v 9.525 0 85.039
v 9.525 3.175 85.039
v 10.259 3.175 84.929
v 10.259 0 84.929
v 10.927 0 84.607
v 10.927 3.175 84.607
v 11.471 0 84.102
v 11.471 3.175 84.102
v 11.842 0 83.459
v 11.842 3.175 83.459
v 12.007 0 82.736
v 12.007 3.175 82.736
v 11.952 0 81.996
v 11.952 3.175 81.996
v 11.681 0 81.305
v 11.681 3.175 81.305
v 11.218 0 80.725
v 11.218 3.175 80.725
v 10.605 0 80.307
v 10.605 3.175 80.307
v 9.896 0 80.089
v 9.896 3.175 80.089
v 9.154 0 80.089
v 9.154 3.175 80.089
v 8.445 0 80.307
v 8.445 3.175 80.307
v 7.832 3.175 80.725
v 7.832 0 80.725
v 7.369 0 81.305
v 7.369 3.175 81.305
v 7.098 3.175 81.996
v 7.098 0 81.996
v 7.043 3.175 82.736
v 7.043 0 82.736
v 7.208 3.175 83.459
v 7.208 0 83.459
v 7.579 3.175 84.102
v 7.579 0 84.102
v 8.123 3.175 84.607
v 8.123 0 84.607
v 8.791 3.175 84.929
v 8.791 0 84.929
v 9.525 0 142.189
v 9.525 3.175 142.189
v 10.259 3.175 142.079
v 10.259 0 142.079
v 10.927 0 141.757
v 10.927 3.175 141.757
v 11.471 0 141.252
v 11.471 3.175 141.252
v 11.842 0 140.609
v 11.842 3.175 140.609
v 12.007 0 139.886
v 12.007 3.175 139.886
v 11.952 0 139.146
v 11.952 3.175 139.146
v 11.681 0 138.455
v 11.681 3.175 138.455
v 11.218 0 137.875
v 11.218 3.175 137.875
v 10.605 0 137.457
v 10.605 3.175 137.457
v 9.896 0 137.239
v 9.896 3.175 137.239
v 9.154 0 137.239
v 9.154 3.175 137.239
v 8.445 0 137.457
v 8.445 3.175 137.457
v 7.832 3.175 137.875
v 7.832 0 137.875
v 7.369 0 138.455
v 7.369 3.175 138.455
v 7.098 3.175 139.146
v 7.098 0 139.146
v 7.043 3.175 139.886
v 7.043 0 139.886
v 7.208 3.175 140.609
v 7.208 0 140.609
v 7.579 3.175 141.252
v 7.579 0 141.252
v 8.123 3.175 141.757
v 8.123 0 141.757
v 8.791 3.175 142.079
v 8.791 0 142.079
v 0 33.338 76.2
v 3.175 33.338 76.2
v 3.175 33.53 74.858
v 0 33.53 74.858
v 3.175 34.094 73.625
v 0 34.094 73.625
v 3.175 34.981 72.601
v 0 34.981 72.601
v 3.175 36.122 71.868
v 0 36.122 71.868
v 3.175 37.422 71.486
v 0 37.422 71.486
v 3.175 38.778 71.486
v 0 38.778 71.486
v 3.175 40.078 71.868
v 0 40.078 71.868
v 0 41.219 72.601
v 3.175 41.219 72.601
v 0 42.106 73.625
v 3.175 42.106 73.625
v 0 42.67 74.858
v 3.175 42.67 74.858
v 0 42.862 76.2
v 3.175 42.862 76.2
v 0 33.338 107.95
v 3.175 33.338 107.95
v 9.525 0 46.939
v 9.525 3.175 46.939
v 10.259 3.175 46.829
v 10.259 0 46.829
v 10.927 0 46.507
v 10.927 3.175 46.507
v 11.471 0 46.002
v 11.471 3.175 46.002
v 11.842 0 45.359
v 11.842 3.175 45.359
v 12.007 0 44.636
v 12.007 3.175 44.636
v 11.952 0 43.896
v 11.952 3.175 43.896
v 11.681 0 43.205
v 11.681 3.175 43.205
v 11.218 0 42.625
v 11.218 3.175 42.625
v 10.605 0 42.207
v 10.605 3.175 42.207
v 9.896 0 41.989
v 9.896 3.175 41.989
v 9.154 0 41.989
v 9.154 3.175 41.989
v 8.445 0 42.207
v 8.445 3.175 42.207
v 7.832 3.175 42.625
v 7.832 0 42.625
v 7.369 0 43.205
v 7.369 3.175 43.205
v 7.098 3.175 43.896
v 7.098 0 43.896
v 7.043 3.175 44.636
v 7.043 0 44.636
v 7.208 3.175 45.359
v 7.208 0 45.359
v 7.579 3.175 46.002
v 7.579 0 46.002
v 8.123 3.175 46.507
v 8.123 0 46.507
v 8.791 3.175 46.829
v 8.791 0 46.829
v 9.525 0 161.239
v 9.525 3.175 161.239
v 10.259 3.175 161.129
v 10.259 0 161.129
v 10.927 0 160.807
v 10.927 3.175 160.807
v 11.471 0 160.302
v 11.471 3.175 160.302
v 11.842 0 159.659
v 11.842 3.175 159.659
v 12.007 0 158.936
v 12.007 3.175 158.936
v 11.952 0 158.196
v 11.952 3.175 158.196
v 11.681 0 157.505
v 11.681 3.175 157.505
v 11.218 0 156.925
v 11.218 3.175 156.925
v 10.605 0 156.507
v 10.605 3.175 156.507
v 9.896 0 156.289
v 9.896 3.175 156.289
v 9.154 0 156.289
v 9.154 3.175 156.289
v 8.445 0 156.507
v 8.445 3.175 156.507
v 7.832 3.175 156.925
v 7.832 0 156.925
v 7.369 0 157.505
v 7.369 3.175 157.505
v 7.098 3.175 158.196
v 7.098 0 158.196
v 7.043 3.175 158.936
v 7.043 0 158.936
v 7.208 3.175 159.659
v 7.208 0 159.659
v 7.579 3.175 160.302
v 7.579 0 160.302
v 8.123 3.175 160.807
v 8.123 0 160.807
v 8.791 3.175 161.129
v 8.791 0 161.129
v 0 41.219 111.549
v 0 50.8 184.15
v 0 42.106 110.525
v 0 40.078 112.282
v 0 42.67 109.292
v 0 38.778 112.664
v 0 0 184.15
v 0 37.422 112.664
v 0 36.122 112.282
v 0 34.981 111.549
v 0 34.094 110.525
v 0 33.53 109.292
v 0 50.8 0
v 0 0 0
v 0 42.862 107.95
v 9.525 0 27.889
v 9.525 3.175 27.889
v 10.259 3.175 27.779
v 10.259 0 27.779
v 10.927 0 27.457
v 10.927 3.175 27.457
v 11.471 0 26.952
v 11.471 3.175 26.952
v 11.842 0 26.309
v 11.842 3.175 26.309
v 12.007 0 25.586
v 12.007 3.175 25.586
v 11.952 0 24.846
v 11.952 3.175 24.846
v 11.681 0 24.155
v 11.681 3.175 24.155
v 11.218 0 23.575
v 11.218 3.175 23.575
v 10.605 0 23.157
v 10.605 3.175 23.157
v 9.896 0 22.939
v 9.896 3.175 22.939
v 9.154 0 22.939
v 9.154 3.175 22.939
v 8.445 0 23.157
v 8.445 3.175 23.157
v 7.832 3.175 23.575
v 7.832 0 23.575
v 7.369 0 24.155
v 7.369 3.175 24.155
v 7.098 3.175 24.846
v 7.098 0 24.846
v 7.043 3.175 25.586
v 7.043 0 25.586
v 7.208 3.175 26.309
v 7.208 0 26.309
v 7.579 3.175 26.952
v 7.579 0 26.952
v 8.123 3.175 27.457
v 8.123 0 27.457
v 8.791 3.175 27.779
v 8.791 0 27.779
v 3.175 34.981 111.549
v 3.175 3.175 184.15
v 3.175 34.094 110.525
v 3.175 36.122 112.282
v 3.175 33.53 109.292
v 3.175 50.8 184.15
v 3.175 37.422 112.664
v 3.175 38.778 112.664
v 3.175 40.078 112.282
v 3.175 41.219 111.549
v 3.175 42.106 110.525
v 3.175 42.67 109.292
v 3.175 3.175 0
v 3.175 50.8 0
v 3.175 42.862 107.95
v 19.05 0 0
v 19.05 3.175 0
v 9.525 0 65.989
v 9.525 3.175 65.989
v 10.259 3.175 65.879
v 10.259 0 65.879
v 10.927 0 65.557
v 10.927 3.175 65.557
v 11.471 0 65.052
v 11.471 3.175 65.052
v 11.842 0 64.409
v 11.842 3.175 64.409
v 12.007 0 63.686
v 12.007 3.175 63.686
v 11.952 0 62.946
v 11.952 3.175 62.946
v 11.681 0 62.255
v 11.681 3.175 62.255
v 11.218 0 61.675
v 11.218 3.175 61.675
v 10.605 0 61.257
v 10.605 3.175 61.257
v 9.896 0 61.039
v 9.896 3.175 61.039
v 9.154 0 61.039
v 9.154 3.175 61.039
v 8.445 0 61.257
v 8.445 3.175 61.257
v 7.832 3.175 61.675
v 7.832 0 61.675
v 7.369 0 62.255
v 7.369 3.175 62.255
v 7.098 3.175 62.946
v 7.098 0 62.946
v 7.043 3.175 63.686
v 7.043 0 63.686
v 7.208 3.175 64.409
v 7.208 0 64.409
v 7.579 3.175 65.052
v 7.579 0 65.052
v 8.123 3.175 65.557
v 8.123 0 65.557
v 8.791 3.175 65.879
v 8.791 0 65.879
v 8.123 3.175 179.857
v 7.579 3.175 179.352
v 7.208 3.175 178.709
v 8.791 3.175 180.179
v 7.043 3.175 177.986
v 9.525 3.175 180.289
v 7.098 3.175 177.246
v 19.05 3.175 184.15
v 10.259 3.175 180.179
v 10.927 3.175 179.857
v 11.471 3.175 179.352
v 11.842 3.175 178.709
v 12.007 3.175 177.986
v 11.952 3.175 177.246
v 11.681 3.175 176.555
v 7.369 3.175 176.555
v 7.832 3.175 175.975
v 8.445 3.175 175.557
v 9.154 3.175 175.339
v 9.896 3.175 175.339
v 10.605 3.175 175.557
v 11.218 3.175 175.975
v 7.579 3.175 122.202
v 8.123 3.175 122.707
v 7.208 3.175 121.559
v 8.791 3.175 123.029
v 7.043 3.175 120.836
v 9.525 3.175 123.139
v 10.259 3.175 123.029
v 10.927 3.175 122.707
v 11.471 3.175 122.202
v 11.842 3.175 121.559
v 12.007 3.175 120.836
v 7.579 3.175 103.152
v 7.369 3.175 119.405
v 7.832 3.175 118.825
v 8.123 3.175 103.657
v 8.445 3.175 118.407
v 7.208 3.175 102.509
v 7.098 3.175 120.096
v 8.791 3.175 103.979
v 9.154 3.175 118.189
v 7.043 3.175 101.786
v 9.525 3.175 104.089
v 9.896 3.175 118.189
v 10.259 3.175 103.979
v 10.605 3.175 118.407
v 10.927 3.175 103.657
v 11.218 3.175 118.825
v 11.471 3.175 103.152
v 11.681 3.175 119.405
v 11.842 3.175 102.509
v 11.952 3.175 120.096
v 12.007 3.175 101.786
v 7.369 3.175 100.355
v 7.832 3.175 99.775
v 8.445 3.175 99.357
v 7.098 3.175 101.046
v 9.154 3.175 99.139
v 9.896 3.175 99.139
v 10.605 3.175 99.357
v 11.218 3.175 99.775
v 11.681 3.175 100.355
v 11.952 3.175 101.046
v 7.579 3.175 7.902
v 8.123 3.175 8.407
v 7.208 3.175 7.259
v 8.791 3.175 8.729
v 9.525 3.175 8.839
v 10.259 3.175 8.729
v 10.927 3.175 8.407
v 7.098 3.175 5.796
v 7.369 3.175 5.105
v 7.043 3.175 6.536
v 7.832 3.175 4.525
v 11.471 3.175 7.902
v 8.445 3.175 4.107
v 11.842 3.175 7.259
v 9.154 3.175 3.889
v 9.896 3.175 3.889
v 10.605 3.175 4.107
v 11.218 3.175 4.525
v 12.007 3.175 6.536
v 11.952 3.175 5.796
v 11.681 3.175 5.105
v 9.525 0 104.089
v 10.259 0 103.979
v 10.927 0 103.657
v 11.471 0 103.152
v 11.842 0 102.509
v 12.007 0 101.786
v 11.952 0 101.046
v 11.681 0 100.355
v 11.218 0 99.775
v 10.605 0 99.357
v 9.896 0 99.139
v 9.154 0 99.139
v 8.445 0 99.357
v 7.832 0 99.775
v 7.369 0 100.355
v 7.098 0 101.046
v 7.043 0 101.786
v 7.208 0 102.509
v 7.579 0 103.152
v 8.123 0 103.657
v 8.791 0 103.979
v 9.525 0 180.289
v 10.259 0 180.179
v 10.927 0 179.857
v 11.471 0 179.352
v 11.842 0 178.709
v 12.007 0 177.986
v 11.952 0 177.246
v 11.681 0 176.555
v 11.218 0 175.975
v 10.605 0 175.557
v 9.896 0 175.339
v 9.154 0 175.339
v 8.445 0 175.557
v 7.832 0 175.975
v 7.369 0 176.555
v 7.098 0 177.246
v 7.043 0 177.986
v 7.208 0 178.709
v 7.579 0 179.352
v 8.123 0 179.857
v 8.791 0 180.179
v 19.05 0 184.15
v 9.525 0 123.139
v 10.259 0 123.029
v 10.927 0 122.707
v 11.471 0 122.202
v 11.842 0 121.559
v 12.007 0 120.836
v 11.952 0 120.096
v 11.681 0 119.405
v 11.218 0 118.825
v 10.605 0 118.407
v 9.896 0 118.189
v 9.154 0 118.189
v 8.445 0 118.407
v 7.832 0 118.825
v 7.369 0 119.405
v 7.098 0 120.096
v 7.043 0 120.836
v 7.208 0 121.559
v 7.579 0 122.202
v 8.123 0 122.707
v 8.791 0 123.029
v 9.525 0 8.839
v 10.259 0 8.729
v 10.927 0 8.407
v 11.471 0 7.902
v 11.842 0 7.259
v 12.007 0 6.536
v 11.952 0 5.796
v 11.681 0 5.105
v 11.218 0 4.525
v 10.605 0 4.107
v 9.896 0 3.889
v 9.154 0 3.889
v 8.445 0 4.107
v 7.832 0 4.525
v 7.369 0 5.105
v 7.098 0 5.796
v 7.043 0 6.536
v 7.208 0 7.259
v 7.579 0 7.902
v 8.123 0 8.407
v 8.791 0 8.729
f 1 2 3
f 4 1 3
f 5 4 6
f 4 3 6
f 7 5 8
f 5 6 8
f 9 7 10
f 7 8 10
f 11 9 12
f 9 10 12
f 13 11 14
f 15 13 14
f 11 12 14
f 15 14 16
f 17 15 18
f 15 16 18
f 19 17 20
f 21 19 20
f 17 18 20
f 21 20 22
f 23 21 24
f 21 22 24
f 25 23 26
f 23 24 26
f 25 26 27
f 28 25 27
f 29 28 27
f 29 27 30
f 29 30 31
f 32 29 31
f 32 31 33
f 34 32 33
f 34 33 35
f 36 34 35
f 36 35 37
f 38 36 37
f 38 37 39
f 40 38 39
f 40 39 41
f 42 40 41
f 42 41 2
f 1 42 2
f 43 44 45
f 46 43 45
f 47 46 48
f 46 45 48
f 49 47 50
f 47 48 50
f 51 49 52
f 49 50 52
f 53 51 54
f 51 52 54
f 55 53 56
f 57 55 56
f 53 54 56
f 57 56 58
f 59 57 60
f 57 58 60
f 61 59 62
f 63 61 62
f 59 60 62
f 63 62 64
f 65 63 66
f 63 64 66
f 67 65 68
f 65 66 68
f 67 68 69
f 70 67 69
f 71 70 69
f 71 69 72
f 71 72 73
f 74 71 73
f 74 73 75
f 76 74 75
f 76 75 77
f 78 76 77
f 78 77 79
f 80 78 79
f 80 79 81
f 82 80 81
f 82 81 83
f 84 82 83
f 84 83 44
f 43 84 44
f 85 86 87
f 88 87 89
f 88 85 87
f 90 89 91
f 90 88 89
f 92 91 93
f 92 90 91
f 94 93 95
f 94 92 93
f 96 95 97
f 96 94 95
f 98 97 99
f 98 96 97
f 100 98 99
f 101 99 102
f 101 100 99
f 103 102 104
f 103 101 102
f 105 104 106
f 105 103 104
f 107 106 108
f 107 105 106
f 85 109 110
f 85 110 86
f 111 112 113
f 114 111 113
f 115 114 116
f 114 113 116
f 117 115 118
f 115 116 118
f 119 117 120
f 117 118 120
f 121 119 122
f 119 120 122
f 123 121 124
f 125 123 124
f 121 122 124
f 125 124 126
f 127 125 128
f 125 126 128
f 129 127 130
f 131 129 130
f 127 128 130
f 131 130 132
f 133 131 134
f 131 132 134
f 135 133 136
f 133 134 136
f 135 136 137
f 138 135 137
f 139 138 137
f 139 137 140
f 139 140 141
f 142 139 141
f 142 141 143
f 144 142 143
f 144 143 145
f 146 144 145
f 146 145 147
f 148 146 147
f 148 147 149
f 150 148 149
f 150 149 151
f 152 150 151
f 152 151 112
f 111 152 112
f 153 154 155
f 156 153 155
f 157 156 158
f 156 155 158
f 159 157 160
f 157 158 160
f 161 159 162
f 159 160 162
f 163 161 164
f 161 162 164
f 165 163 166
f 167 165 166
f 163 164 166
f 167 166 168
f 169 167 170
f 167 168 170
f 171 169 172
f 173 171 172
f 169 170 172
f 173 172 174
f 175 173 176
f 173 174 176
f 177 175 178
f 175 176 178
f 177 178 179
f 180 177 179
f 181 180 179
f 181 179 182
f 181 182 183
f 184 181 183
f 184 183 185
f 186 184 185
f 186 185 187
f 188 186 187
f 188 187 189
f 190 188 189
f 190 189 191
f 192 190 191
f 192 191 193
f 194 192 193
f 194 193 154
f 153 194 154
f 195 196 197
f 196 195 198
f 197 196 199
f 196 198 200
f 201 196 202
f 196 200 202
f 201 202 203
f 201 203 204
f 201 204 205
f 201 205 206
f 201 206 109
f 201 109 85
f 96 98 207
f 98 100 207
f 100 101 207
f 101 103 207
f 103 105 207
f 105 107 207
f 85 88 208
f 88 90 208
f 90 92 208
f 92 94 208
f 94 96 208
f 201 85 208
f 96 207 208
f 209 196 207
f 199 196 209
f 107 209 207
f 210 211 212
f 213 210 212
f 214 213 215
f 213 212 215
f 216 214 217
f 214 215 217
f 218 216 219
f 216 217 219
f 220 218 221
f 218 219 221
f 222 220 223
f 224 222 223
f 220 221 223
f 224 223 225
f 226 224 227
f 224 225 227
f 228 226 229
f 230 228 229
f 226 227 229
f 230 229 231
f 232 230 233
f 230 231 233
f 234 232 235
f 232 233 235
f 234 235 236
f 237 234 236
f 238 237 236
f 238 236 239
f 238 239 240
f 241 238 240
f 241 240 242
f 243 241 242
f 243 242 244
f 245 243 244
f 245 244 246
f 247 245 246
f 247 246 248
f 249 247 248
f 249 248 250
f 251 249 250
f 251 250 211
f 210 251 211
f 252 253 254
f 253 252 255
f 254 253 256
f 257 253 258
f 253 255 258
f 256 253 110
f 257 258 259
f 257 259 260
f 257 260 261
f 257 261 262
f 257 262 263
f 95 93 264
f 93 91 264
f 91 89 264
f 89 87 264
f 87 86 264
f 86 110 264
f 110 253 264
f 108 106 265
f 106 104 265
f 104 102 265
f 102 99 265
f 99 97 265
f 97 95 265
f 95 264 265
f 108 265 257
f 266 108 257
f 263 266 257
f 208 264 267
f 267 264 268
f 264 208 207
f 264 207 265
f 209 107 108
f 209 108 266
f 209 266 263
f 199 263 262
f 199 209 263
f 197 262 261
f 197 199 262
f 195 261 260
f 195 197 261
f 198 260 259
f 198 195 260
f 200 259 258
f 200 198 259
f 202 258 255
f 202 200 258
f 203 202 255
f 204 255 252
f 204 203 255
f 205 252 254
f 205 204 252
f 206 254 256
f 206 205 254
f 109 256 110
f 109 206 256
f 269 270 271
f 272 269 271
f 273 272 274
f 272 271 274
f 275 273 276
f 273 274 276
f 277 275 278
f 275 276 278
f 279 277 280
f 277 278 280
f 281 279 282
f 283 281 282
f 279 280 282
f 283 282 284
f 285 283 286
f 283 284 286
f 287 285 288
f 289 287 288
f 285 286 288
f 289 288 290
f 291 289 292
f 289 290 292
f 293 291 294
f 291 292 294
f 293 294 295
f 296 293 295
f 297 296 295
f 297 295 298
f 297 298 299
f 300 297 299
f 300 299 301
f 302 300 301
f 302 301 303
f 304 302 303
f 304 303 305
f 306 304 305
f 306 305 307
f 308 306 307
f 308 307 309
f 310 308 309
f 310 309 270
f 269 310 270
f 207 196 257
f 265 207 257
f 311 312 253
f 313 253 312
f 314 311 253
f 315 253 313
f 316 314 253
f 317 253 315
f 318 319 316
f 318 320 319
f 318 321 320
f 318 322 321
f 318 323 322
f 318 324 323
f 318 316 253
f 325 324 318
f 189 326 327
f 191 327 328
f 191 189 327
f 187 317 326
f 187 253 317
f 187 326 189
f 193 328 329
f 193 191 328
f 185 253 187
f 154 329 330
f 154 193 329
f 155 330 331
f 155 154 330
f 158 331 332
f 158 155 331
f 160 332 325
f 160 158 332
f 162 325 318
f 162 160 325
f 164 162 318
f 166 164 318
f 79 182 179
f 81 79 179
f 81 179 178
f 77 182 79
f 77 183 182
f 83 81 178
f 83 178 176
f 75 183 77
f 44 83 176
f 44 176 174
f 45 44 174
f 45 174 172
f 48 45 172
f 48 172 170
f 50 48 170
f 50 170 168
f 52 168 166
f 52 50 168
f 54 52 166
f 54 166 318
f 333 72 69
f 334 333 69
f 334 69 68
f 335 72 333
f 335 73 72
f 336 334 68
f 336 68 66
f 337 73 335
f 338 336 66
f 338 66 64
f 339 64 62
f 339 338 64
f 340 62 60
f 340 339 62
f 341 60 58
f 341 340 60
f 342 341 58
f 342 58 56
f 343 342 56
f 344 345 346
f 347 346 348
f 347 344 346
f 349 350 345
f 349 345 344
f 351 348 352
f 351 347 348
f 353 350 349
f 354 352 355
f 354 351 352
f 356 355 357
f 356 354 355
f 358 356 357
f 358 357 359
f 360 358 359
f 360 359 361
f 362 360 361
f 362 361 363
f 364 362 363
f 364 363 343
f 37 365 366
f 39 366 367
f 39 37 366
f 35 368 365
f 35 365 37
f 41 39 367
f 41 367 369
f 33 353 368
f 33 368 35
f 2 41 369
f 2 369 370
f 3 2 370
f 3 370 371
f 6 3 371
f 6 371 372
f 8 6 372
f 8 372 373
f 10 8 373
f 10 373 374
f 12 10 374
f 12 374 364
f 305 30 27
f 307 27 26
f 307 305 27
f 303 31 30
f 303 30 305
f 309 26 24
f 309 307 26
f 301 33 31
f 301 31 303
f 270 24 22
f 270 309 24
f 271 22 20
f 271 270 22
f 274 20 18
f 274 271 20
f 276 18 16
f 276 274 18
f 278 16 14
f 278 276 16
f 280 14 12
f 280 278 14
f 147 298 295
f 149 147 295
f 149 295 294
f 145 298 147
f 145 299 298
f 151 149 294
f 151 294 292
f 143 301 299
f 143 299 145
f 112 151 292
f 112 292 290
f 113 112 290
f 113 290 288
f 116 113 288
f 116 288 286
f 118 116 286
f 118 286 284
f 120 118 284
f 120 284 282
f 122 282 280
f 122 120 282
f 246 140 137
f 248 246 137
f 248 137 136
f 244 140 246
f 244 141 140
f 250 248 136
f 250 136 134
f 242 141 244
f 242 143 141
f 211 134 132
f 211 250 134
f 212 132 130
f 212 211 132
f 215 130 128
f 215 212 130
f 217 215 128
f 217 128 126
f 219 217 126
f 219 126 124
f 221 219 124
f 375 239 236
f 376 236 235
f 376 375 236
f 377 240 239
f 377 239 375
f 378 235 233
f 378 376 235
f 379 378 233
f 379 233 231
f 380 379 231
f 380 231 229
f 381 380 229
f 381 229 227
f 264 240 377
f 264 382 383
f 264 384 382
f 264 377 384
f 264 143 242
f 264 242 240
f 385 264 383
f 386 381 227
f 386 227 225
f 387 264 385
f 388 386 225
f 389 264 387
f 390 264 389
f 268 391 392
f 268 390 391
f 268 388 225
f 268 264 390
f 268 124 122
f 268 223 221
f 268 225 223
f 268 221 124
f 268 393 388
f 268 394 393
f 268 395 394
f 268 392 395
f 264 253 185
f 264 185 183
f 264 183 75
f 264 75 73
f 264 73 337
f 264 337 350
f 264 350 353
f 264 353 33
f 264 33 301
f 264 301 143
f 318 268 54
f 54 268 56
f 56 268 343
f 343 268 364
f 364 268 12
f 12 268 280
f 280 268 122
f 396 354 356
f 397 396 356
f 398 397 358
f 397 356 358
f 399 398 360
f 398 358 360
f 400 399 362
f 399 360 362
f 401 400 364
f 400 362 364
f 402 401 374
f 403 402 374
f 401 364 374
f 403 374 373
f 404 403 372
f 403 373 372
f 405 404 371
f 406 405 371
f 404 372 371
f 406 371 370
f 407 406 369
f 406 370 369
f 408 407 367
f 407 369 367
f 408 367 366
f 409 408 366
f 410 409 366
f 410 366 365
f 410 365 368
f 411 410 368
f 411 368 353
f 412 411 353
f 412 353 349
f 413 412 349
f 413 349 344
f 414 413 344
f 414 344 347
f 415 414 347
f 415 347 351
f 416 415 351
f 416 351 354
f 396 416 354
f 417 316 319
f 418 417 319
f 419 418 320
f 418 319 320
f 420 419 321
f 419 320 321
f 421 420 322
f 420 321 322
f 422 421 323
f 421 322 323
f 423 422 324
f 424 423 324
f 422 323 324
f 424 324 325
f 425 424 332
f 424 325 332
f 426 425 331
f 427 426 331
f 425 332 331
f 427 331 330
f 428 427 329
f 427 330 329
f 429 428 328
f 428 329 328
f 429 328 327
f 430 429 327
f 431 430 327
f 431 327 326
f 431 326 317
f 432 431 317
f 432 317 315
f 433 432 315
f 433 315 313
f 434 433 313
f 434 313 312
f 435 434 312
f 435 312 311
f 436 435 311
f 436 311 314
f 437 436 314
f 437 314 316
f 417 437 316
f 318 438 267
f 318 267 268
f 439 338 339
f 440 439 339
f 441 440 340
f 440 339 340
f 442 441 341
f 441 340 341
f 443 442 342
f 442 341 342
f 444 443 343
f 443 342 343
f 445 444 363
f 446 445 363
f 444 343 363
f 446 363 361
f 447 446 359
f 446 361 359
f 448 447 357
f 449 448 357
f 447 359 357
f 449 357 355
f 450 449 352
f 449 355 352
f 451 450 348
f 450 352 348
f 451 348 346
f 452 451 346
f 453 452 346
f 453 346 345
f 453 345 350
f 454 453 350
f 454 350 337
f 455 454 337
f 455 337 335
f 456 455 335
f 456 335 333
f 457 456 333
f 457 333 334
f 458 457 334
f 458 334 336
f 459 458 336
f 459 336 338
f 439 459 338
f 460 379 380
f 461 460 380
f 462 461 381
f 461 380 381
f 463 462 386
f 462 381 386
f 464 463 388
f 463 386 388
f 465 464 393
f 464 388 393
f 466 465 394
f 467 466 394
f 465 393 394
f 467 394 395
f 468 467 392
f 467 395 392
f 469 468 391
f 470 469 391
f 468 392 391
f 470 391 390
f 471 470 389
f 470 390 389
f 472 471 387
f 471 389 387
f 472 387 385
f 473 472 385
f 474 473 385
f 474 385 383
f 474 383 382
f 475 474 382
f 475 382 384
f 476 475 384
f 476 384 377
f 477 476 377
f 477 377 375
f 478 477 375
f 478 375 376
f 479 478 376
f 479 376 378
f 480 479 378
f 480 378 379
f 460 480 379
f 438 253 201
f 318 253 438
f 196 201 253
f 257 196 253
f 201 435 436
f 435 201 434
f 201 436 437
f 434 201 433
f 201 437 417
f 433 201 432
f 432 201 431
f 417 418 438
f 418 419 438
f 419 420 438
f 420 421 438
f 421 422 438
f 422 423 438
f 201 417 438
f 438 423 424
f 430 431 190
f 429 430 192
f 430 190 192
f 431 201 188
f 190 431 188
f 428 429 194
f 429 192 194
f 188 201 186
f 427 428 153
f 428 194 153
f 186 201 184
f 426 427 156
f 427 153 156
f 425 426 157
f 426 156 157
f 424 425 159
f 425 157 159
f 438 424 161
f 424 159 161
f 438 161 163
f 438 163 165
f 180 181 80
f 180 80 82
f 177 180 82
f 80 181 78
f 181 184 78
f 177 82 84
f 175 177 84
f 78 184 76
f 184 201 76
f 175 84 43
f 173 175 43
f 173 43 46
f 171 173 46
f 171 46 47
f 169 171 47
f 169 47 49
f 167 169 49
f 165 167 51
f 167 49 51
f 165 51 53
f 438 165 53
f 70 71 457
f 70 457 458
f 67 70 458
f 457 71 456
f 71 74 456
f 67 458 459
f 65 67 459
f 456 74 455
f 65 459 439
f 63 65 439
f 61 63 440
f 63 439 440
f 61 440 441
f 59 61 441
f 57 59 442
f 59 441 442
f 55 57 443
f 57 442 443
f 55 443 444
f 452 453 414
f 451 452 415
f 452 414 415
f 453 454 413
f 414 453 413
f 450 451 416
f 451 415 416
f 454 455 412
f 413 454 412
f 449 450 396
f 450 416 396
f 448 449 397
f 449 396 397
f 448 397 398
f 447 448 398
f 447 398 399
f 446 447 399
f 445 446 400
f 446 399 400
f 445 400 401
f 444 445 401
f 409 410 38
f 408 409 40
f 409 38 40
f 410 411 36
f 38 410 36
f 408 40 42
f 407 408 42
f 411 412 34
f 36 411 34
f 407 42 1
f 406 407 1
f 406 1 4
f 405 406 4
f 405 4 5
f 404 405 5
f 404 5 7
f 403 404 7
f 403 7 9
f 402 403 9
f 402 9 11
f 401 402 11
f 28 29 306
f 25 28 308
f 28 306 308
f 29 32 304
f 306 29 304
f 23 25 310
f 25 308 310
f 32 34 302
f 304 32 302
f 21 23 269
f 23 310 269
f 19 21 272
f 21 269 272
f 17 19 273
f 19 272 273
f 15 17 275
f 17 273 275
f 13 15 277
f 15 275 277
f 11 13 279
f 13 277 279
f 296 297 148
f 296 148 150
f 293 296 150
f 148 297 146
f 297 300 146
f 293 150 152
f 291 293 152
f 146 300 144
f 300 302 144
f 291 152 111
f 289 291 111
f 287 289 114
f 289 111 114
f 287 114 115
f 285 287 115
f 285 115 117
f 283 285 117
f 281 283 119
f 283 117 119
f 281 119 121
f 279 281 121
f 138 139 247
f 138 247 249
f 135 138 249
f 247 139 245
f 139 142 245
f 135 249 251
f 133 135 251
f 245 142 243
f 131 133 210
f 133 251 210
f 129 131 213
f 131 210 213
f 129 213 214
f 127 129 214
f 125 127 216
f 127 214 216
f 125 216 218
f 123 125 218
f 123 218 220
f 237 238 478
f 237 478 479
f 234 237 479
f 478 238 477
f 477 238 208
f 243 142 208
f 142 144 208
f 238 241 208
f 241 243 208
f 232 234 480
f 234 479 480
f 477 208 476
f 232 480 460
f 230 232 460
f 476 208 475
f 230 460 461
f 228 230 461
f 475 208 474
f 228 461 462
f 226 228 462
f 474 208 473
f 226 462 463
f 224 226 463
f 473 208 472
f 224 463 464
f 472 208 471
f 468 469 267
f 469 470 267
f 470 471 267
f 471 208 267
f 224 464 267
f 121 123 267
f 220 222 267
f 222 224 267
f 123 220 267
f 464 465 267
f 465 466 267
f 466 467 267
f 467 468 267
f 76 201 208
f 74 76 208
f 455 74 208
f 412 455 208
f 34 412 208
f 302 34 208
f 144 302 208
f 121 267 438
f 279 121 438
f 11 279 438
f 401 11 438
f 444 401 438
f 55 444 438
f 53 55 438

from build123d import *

# Parameters (mm, degrees)
SKETCH1_W           = 3.175
SKETCH1_H           = 47.625
SKETCH1_H_2         = 3.175
SKETCH1_W_2         = 15.875
BOSS_EXTRUDE1_DEPTH = 184.15
SKETCH2_R           = 2.4892
CUT_EXTRUDE1_DEPTH  = 184.15
CUT_EXTRUDE2_DEPTH  = 165.1


with BuildPart() as part:
    # Sketch1 → Boss-Extrude1 (new body)
    with BuildSketch(Plane.XY):
        with Locations((1.5875, 26.9875)):
            Rectangle(SKETCH1_W, SKETCH1_H)
        with Locations((1.5875, 1.5875)):
            Rectangle(SKETCH1_W, SKETCH1_H_2)
        with Locations((11.1125, 1.5875)):
            Rectangle(SKETCH1_W_2, SKETCH1_H_2)
    extrude(amount=BOSS_EXTRUDE1_DEPTH)

    # Sketch2 → Cut-Extrude1 (cut)
    with BuildSketch(Plane(origin=(0, 3.175, 0), x_dir=(1, 0, 0), z_dir=(0, 1, 0))):
        with Locations(Location((9.525, -6.35, 0), (0, 0, 270))):
            Circle(SKETCH2_R)
        with Locations(Location((9.525, -25.4, 0), (0, 0, 270))):
            Circle(SKETCH2_R)
        with Locations(Location((9.525, -44.45, 0), (0, 0, 270))):
            Circle(SKETCH2_R)
        with Locations(Location((9.525, -63.5, 0), (0, 0, 270))):
            Circle(SKETCH2_R)
        with Locations(Location((9.525, -82.55, 0), (0, 0, 270))):
            Circle(SKETCH2_R)
        with Locations(Location((9.525, -101.6, 0), (0, 0, 270))):
            Circle(SKETCH2_R)
        with Locations(Location((9.525, -120.65, 0), (0, 0, 270))):
            Circle(SKETCH2_R)
        with Locations(Location((9.525, -139.7, 0), (0, 0, 270))):
            Circle(SKETCH2_R)
        with Locations(Location((9.525, -158.75, 0), (0, 0, 270))):
            Circle(SKETCH2_R)
        with Locations(Location((9.525, -177.8, 0), (0, 0, 270))):
            Circle(SKETCH2_R)
    extrude(amount=-CUT_EXTRUDE1_DEPTH, mode=Mode.SUBTRACT)

    # Sketch3 → Cut-Extrude2 (cut)
    with BuildSketch(Plane.ZY):
        with BuildLine():
            Line((76.2, 42.8625), (107.95, 42.8625))
            ThreePointArc((107.95, 42.8625), (112.7125, 38.1), (107.95, 33.3375))
            Line((107.95, 33.3375), (76.2, 33.3375))
            ThreePointArc((76.2, 33.3375), (71.4375, 38.1), (76.2, 42.8625))
        make_face()
    extrude(amount=-CUT_EXTRUDE2_DEPTH, mode=Mode.SUBTRACT)


solid = part.part
